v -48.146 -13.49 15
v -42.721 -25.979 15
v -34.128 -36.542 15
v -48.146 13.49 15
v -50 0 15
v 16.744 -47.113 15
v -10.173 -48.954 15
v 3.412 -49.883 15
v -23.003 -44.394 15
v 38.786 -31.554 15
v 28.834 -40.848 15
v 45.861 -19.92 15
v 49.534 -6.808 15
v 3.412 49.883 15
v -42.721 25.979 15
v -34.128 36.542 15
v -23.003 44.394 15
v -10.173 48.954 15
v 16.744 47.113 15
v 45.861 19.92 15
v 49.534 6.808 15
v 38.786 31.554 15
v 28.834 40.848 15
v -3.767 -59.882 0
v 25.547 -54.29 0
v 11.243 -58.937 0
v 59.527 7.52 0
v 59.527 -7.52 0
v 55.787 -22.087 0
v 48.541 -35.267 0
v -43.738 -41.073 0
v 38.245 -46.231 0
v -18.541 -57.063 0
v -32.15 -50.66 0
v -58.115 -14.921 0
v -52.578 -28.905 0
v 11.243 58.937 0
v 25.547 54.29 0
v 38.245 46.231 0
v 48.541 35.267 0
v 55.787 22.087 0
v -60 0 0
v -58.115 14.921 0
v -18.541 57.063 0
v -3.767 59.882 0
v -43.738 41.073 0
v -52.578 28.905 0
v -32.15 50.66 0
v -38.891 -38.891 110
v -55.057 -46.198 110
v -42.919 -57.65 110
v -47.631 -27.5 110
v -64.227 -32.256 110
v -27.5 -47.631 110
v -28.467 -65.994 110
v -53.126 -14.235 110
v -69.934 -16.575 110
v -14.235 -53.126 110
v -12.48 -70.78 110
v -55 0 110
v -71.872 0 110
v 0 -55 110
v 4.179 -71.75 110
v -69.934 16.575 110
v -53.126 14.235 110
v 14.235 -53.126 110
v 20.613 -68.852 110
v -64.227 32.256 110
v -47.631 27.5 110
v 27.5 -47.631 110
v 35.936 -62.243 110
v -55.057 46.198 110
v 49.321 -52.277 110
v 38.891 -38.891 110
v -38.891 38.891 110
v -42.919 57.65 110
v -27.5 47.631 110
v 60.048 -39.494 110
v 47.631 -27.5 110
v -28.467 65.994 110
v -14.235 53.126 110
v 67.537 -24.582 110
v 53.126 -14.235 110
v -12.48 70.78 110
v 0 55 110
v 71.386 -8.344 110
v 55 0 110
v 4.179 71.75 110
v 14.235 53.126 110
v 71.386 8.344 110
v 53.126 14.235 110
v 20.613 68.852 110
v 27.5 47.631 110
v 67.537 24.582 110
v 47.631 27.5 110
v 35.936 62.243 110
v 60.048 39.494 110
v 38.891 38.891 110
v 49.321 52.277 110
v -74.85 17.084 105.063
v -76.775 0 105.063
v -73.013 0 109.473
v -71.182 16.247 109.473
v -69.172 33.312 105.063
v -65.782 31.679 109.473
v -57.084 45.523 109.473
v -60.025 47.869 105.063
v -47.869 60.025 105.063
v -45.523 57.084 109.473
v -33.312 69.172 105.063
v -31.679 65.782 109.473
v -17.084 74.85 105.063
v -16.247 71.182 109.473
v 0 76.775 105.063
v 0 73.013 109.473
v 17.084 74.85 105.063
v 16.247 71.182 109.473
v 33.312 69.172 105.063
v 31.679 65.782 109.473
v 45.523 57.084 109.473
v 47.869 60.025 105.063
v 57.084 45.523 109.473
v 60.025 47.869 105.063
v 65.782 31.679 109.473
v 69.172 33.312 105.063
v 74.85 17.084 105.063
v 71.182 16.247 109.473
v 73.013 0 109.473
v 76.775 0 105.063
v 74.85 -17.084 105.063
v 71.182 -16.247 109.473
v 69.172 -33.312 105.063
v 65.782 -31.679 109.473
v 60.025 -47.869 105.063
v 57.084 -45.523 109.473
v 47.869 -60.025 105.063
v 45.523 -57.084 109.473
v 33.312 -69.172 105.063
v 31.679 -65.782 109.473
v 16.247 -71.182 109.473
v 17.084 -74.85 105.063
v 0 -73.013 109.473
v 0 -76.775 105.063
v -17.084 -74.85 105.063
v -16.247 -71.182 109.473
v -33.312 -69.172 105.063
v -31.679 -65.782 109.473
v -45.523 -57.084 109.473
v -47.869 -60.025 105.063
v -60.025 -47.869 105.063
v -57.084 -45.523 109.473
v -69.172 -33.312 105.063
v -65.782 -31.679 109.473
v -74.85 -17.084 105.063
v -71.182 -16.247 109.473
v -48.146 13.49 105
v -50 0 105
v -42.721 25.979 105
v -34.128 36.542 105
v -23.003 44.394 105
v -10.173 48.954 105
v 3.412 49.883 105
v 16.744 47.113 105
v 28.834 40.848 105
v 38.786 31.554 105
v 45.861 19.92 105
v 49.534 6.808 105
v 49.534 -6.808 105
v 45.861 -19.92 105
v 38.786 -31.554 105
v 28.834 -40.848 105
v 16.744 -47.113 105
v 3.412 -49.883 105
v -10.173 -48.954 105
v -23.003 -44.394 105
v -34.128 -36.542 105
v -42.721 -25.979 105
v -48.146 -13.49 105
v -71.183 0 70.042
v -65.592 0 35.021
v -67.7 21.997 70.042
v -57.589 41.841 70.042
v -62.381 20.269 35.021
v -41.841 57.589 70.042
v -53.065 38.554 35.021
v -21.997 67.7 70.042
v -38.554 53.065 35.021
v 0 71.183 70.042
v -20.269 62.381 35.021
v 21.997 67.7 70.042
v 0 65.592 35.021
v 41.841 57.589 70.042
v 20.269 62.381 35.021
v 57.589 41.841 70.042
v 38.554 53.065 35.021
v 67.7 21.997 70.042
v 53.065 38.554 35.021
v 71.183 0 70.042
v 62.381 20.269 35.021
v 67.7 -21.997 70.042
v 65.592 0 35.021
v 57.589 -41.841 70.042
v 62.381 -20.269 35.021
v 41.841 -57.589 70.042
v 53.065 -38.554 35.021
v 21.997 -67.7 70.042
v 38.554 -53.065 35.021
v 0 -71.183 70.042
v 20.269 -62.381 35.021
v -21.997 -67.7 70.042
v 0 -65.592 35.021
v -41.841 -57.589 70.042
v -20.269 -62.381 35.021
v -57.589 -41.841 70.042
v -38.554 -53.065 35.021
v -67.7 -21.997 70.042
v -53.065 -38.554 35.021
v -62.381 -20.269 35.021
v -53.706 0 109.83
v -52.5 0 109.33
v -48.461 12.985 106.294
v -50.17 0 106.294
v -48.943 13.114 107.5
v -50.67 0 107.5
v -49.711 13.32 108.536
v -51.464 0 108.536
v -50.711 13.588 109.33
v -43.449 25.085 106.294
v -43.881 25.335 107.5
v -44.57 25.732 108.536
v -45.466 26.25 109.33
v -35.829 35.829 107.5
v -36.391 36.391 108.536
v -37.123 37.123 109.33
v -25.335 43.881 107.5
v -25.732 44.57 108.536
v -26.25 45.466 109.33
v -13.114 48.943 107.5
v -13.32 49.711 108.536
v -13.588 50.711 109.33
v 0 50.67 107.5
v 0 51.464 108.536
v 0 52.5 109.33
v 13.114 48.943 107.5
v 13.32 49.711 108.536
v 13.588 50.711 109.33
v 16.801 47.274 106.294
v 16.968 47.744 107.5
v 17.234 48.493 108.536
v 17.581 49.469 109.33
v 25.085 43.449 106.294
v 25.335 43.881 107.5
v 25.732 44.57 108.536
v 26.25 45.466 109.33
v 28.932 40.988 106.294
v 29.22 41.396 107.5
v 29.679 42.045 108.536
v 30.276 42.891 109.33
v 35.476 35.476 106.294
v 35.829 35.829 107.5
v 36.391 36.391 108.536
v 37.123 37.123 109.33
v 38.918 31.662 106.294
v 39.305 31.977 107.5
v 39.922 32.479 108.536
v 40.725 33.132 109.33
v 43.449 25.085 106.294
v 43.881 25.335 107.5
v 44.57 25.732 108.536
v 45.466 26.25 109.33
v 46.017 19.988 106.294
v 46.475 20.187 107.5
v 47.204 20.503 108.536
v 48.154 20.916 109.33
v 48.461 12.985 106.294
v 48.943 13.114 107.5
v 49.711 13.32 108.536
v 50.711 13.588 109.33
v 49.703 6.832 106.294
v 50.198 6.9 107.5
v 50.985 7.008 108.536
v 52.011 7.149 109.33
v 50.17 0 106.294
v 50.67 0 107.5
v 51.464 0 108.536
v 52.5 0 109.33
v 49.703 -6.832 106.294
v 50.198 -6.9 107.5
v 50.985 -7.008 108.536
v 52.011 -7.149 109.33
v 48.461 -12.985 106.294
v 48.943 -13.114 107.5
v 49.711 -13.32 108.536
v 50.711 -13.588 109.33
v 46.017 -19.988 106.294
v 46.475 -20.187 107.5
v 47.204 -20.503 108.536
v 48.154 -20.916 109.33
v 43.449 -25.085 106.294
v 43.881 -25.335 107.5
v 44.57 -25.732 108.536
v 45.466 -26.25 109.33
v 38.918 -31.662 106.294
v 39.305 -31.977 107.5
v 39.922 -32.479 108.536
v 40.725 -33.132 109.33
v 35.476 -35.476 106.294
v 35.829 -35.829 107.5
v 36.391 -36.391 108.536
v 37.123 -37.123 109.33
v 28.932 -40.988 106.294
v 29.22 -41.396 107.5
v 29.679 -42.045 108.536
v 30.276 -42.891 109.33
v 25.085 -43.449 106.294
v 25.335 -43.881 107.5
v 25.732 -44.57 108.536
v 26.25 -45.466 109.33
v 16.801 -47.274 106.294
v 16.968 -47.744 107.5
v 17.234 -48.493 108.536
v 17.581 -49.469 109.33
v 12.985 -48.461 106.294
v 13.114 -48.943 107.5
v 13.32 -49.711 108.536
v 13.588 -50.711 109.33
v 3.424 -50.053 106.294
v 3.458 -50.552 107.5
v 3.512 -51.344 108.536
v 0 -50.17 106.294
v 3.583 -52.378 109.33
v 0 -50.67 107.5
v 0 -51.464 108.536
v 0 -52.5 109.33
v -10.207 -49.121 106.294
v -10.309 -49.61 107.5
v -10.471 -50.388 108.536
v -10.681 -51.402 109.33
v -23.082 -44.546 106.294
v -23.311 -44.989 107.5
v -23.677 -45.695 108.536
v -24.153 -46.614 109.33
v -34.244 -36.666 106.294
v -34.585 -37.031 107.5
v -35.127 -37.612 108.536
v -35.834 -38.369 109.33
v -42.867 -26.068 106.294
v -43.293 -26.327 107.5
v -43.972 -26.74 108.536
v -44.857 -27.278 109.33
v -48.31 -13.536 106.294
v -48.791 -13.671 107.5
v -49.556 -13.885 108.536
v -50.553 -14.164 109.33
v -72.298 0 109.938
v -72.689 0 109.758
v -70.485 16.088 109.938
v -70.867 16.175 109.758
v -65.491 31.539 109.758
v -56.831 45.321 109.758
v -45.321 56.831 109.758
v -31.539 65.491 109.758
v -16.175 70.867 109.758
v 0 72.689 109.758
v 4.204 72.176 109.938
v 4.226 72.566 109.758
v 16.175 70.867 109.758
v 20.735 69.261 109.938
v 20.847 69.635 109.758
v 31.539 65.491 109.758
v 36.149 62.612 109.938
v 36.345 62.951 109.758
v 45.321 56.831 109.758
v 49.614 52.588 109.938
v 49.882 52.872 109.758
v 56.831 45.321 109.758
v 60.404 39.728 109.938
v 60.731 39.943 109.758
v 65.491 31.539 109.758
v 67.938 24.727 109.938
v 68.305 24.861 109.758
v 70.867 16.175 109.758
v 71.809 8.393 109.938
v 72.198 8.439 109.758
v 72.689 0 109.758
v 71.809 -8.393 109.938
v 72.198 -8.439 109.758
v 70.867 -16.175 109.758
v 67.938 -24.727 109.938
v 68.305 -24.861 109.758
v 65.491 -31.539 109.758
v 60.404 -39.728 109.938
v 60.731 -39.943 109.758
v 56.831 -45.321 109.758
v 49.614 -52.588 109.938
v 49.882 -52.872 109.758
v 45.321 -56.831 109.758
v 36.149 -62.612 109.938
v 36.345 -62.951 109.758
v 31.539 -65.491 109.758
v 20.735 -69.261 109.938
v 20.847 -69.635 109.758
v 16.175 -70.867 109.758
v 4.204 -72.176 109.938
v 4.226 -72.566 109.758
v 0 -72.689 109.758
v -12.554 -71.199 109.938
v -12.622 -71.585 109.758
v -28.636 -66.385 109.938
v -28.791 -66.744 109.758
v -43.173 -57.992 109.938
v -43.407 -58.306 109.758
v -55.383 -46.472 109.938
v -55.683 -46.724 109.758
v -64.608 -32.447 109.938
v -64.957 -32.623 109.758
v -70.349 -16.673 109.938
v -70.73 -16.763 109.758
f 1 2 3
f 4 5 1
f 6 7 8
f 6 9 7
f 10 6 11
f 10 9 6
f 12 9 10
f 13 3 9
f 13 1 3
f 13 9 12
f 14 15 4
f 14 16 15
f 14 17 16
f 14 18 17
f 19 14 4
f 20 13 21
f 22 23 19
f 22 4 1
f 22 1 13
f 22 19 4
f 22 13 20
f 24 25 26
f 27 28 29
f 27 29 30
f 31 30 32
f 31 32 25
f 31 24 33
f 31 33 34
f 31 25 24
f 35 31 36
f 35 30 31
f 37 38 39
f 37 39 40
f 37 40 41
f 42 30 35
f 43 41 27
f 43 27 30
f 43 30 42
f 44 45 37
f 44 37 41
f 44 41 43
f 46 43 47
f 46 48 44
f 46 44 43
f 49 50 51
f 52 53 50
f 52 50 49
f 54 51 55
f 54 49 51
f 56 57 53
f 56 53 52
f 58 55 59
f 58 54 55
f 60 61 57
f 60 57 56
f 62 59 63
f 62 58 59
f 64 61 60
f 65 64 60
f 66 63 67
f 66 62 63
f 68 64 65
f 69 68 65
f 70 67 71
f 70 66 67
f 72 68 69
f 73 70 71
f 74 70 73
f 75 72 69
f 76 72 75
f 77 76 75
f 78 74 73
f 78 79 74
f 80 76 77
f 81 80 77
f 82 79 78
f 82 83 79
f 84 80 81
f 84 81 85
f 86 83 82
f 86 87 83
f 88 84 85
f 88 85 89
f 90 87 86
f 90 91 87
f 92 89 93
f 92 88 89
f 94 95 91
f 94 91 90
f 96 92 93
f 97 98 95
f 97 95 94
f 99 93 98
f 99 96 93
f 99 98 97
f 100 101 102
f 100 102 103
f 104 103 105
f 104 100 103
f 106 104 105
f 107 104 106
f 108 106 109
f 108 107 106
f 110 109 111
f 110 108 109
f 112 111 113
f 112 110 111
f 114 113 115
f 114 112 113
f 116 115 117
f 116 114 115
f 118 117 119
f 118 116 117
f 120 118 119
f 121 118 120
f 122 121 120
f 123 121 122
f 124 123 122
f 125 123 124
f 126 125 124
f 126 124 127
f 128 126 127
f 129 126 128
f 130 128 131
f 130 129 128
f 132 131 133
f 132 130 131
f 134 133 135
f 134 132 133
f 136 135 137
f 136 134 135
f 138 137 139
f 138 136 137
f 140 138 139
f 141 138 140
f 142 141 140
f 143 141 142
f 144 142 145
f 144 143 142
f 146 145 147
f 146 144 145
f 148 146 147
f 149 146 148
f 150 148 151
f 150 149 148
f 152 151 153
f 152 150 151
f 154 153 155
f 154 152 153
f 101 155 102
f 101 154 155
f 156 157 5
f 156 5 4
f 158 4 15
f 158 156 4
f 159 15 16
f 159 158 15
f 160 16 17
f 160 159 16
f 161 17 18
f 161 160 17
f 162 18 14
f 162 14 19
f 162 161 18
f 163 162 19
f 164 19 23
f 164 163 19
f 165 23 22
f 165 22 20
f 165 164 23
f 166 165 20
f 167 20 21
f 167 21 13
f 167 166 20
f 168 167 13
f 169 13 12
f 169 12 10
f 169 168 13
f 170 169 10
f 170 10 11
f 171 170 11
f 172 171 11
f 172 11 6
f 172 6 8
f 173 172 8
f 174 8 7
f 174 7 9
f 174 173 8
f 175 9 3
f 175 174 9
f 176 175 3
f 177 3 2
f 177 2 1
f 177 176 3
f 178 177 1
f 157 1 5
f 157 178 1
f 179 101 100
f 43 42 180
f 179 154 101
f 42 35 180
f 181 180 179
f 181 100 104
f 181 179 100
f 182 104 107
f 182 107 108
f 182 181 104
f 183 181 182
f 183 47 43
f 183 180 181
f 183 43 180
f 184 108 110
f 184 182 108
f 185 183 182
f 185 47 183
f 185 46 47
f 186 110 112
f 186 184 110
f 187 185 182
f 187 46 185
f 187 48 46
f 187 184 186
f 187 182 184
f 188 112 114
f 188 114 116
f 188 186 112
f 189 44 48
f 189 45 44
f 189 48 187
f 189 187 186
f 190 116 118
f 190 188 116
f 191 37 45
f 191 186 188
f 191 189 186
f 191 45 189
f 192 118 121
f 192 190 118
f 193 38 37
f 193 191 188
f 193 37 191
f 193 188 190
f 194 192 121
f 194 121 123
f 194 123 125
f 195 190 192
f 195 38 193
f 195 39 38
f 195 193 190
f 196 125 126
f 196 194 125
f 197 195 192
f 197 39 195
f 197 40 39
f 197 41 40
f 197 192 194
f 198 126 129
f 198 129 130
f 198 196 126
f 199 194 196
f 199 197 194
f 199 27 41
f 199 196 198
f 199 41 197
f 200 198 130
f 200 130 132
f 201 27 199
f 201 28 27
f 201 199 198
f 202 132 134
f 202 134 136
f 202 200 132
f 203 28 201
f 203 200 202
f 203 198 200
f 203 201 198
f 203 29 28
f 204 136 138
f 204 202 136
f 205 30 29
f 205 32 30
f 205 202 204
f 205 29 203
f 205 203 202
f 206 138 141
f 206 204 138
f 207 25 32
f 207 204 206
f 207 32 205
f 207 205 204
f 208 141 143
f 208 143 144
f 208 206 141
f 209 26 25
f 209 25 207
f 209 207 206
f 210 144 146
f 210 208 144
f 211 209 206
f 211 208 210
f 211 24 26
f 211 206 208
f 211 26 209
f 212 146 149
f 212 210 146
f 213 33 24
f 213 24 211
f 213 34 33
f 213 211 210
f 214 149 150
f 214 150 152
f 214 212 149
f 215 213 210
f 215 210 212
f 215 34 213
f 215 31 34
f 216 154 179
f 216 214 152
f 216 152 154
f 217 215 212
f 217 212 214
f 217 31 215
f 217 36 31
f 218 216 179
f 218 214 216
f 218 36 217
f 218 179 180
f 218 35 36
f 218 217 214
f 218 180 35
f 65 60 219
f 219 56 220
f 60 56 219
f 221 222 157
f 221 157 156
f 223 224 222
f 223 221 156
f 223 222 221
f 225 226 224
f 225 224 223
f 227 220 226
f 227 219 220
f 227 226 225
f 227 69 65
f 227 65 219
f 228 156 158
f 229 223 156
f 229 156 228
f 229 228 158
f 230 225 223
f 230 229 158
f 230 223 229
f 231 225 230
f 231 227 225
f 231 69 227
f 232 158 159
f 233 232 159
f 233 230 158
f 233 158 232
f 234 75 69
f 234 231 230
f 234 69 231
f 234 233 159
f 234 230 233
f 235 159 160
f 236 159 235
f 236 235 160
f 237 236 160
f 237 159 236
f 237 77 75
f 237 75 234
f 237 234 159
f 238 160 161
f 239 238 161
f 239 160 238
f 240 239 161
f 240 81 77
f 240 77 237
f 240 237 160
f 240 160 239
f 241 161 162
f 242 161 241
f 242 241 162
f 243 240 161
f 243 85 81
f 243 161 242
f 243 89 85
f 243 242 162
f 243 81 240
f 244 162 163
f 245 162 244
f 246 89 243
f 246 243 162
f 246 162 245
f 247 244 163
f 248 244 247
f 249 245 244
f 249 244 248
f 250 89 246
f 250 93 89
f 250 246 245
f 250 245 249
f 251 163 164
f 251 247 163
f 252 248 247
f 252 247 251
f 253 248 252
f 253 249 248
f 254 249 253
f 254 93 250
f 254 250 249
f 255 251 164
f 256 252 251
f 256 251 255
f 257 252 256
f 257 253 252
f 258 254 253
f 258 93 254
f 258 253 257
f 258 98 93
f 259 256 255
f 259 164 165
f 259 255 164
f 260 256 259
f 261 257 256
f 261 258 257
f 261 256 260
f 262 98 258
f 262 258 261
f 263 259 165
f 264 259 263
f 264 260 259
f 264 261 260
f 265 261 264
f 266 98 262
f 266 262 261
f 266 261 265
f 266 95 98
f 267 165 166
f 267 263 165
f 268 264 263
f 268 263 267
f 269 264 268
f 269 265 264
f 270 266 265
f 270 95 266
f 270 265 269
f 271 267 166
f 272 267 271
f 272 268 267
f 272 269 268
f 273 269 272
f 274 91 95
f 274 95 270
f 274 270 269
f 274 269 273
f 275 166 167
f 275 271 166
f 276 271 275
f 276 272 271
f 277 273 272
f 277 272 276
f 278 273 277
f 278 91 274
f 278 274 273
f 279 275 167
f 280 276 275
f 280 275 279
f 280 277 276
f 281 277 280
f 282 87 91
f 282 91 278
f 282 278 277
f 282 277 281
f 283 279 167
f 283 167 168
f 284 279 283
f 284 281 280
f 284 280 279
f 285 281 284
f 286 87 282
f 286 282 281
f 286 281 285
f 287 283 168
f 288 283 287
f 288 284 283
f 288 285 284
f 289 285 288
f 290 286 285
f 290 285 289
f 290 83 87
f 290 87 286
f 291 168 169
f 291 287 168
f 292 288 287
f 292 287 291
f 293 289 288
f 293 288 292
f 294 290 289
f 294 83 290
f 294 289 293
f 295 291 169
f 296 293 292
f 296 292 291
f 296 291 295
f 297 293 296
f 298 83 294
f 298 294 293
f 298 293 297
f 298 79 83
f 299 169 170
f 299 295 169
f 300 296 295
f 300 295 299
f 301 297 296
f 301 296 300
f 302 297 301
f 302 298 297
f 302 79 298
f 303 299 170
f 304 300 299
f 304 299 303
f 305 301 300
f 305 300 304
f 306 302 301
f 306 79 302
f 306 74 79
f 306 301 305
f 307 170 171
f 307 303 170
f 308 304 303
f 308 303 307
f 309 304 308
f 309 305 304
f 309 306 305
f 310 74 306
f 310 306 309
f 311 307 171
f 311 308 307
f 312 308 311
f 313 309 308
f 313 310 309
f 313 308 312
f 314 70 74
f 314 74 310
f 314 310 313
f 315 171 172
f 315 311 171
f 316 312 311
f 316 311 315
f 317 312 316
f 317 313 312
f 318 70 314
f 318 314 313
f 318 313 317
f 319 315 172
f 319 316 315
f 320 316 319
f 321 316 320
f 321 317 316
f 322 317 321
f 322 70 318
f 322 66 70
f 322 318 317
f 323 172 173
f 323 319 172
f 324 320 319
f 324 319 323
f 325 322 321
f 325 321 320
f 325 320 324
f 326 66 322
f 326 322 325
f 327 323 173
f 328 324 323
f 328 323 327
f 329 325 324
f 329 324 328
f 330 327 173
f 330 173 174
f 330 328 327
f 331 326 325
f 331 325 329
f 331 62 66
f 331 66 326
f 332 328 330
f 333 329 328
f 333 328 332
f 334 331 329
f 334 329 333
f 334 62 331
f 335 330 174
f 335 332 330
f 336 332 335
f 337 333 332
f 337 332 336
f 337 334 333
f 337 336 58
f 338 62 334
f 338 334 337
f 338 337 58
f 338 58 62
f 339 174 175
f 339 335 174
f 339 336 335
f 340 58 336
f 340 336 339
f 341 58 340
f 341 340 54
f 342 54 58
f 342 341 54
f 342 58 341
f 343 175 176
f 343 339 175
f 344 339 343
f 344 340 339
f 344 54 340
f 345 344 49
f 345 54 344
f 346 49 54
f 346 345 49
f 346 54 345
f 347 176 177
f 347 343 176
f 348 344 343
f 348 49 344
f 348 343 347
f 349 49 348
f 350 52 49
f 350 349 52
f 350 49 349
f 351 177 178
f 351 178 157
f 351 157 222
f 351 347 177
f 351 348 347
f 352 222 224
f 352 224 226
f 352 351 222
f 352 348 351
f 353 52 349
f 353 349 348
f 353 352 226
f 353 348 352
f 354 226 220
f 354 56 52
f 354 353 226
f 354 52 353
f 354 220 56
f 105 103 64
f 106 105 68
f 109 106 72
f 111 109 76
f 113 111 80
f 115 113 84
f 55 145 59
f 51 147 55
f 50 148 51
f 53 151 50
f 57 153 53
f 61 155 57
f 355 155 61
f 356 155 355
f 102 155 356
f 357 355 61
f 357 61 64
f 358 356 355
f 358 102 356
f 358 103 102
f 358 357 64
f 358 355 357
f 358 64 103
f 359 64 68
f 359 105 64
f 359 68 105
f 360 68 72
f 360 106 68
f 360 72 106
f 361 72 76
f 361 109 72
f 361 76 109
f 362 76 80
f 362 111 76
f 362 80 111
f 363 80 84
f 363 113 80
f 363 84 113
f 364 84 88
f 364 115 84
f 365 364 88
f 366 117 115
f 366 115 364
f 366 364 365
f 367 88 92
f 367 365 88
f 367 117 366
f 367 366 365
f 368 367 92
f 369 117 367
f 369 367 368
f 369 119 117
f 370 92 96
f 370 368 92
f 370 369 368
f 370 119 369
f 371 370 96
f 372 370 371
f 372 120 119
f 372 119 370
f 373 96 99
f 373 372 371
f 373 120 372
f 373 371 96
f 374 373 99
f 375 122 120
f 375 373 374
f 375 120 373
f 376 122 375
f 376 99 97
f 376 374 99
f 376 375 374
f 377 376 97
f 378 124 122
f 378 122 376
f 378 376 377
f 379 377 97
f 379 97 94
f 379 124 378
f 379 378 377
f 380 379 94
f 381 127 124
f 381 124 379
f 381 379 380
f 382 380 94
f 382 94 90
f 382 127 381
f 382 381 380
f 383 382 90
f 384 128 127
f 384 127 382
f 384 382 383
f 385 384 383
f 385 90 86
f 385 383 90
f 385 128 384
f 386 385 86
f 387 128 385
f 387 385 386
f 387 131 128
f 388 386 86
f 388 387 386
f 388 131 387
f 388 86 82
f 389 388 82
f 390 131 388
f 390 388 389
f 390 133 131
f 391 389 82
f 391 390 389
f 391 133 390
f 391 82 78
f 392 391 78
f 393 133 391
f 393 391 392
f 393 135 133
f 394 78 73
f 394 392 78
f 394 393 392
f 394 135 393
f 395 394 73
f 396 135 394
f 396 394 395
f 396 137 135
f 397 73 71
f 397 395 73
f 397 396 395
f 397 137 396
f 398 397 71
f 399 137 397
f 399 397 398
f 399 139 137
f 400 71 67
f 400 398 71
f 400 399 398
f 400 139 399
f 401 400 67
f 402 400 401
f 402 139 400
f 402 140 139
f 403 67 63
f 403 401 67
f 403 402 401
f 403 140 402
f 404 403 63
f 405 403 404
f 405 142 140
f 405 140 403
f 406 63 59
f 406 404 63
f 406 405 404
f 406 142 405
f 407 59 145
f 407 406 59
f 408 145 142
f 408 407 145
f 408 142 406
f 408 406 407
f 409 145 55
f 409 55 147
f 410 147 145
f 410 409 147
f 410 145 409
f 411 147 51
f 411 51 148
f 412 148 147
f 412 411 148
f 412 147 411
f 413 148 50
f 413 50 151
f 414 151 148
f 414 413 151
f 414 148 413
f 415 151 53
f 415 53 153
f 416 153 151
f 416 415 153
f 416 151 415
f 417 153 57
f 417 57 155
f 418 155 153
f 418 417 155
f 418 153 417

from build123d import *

# Parameters (mm, degrees)
F2_R    = 5
F3_SIZE = 5
F4_R    = 1.5


with BuildPart() as f1:
    # F0 (on Front) → F1 (revolve)
    with BuildSketch(Plane.XZ):
        Polygon((-60, 0), (0, 0), (0, 15), (-50, 15), (-50, 110), (-77.5635960527, 110), align=None)
    revolve(axis=Axis((0, 0, -4.634299256), (0, 0, -1)))

    # F2
    f2_edges = [f1.edges().sort_by_distance(p)[0] for p in [
        (50, 0, 110),
    ]]
    fillet(f2_edges, radius=F2_R)

    # F3
    f3_edges = [f1.edges().sort_by_distance(p)[0] for p in [
        (77.563596, 0, 110),
    ]]
    chamfer(f3_edges, length=F3_SIZE)

    # F4
    f4_edges = [f1.edges().sort_by_distance(p)[0] for p in [
        (72.563596, 0, 110),
    ]]
    fillet(f4_edges, radius=F4_R)


solid = f1.part
